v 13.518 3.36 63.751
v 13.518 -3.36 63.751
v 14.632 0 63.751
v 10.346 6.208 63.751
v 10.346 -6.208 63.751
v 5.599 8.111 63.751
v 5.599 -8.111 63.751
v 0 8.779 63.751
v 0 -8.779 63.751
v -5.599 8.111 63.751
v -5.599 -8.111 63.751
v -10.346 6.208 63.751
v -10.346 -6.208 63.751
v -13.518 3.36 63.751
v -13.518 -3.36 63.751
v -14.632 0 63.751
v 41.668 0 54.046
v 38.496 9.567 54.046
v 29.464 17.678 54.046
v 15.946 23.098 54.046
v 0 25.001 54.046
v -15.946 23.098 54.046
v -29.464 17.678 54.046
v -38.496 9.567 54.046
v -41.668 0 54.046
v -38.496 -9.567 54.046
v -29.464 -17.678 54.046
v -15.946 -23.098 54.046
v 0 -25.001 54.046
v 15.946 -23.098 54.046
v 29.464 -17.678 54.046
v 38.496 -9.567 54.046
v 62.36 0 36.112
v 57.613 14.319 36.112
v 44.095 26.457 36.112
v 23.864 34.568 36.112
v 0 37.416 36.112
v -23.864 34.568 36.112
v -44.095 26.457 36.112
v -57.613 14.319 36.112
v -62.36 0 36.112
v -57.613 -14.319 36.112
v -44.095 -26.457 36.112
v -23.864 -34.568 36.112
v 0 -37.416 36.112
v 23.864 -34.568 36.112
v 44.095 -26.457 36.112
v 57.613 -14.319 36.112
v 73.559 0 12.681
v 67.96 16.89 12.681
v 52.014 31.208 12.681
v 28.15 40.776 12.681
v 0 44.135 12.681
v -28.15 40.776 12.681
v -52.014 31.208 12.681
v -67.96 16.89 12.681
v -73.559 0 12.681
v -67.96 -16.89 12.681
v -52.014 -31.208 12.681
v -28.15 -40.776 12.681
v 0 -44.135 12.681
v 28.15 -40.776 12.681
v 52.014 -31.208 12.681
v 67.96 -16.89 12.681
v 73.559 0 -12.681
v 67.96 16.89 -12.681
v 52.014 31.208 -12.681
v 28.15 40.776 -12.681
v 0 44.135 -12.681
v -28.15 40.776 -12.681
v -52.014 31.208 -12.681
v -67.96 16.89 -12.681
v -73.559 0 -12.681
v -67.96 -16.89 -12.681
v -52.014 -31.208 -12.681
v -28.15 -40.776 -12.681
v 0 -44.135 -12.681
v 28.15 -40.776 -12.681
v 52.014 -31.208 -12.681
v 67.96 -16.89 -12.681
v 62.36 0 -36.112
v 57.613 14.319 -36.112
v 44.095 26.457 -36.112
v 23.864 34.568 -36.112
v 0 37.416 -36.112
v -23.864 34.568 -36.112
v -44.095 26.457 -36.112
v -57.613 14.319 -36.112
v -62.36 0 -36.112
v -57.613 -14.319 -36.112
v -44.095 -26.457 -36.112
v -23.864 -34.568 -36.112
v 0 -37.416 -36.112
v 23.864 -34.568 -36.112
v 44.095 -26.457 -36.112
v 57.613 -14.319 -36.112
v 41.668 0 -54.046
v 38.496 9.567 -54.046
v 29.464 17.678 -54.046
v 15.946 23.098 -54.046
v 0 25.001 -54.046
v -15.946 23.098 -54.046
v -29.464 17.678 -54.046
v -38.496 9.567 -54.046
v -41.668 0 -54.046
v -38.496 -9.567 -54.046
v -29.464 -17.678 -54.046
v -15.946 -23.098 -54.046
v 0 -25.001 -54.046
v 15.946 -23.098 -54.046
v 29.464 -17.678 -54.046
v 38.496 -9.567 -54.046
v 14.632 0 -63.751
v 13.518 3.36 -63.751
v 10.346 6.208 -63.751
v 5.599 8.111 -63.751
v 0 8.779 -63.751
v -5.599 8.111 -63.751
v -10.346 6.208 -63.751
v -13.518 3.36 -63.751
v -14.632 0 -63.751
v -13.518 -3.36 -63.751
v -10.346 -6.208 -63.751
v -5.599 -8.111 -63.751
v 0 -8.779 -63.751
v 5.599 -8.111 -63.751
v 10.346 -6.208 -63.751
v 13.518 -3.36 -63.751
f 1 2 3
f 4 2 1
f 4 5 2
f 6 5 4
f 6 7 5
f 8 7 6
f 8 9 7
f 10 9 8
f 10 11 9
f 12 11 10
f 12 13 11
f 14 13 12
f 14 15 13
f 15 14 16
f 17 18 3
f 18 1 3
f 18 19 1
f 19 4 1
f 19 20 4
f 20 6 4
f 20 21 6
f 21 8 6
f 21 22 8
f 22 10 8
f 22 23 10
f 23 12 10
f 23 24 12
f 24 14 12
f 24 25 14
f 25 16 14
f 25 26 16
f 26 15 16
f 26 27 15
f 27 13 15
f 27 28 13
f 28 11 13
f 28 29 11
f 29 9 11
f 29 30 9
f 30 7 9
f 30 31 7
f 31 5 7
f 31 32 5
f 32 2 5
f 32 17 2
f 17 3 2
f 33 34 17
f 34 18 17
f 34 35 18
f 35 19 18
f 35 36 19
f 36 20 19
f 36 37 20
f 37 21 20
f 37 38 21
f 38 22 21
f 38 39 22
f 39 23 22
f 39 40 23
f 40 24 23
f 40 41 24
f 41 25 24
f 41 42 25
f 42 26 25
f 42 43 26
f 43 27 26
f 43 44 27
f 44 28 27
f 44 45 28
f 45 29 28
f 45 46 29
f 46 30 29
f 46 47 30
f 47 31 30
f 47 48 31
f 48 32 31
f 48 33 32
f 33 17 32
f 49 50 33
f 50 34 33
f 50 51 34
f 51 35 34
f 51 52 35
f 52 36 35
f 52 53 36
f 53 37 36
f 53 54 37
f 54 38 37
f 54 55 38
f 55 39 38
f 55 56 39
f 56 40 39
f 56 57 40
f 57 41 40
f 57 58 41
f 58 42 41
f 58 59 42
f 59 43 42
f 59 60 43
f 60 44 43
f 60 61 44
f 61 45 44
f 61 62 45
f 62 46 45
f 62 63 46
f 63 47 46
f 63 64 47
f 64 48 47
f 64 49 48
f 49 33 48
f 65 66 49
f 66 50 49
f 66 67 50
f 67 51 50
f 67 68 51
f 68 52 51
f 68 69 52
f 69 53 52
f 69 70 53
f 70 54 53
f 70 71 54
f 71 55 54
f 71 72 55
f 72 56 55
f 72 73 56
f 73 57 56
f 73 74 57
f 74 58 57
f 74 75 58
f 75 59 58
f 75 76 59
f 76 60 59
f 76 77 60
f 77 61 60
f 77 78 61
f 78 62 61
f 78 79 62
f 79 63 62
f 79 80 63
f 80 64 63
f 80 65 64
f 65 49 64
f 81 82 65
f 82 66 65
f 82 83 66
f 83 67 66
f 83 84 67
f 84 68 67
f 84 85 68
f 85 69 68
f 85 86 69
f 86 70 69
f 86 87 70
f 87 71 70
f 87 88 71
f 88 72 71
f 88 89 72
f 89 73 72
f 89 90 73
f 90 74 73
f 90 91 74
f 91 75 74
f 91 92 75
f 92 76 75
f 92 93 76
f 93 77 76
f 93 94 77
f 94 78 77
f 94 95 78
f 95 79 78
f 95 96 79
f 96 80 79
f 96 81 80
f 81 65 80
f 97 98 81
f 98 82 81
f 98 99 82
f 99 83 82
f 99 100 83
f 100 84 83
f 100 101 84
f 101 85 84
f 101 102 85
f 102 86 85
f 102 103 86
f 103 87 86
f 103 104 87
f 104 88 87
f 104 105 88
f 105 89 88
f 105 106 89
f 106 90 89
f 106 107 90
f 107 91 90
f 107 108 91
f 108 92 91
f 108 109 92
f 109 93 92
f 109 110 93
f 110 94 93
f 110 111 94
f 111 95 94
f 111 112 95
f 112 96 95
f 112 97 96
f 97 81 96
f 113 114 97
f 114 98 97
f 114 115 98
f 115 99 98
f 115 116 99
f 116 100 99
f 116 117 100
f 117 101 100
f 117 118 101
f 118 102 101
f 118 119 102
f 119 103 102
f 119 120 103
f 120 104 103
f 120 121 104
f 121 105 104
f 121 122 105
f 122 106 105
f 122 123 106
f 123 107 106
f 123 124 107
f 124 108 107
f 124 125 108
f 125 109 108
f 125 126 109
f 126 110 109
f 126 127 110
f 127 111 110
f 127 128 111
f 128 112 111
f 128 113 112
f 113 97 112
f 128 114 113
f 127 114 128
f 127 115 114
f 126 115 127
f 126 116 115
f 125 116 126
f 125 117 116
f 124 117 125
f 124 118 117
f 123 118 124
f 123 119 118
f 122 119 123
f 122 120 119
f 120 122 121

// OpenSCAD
// Generated by SolidPython 1.0.1 on 2020-07-29 00:46:52


scale(v = [15, 9, 13]) {
	sphere(r = 5);
}
/***********************************************
*********      SolidPython code:      **********
************************************************
 
# import packages: SolidPython
from solid import *
from solid.utils import *
from itertools import chain, combinations, permutations


class Resize:

    def __init__(self, scad_file):
        self.scad_file = scad_file
        #self.scad_file = import_scad(scad_file)
        # cone/cylinder param:
        self.r1 = 0
        self.r2 = 0
        self.h = 0
        # rectangular prism param:
        self.w = 0
        self.l = 0
        # ellipse param:
        self.r = 0

    # import OpenScad code (file name corresponds to shape)


    # classify shape + parameters
    def assign(self, param1, param2, param3):
        if self.scad_file == 'cone.scad':
            self.r1 = param1
            self.r2 = param2
            self.h = param3
        elif self.scad_file == 'cylinder.scad':
            self.r1 = param1
            self.r2 = param2
            self.h = param3
        elif self.scad_file == 'rectangularPrism.scad':
            self.h = param1
            self.l = param2
            self.w = param3
        else:
            self.r = param1
            self.h = param2

    # resize parameters
    def iterate(self):
        x = range(3, 20, 2)
        i = 1
        if self.scad_file == 'cone.scad':
            tempList = list(permutations(x, 2))
            for temp in tempList:
                param1 = temp[0]
                param2 = temp[1]
                filepath = 'produced_scad_files/' + 'cone' + str(param1) + '_' + str(param2) + '_' + '.scad'
                scad_render_to_file(cylinder(h=param1, r1=param2, r2=0), filepath)

        elif self.scad_file == 'cylinder.scad':
            tempList = list(permutations(x, 3))
            for temp in tempList:
                param1 = temp[0]
                param2 = temp[1]
                filepath = 'produced_scad_files/' + 'cylinder' + str(param1) + '_' + str(param2) + '_' + '.scad'
                scad_render_to_file(cylinder(h=param1, r1=param2, r2=param2), filepath)

        elif self.scad_file == 'rectangularPrism.scad':
            tempList = list(permutations(x, 3))
            for temp in tempList:
                param1 = temp[0]
                param2 = temp[1]
                param3 = temp[2]
                filepath = 'produced_scad_files/' + 'rectangularPrism' + str(param1) + '_' + str(param2) + '_' + str(
                    param3) + '.scad'
                scad_render_to_file(cube(size=(param1, param2, param3)), filepath)

        elif self.scad_file == 'ellipse.scad':
            tempList = list(permutations(x, 4))
            for temp in tempList:
                param1 = temp[0]
                param2 = temp[1]
                param3 = temp[2]
                param4 = temp[3]
                filepath = 'produced_scad_files/' + 'ellipse' + str(param1) + '_' + str(param2) + '_' + str(param3) + '_' + str(param4) + '.scad'
                scad_render_to_file(scale([param1, param2, param3])(sphere(r=param4)), filepath)

    def render_to_scadfile(self):
        scad_render_to_file(scad, 'example.scad') 
 
************************************************/
